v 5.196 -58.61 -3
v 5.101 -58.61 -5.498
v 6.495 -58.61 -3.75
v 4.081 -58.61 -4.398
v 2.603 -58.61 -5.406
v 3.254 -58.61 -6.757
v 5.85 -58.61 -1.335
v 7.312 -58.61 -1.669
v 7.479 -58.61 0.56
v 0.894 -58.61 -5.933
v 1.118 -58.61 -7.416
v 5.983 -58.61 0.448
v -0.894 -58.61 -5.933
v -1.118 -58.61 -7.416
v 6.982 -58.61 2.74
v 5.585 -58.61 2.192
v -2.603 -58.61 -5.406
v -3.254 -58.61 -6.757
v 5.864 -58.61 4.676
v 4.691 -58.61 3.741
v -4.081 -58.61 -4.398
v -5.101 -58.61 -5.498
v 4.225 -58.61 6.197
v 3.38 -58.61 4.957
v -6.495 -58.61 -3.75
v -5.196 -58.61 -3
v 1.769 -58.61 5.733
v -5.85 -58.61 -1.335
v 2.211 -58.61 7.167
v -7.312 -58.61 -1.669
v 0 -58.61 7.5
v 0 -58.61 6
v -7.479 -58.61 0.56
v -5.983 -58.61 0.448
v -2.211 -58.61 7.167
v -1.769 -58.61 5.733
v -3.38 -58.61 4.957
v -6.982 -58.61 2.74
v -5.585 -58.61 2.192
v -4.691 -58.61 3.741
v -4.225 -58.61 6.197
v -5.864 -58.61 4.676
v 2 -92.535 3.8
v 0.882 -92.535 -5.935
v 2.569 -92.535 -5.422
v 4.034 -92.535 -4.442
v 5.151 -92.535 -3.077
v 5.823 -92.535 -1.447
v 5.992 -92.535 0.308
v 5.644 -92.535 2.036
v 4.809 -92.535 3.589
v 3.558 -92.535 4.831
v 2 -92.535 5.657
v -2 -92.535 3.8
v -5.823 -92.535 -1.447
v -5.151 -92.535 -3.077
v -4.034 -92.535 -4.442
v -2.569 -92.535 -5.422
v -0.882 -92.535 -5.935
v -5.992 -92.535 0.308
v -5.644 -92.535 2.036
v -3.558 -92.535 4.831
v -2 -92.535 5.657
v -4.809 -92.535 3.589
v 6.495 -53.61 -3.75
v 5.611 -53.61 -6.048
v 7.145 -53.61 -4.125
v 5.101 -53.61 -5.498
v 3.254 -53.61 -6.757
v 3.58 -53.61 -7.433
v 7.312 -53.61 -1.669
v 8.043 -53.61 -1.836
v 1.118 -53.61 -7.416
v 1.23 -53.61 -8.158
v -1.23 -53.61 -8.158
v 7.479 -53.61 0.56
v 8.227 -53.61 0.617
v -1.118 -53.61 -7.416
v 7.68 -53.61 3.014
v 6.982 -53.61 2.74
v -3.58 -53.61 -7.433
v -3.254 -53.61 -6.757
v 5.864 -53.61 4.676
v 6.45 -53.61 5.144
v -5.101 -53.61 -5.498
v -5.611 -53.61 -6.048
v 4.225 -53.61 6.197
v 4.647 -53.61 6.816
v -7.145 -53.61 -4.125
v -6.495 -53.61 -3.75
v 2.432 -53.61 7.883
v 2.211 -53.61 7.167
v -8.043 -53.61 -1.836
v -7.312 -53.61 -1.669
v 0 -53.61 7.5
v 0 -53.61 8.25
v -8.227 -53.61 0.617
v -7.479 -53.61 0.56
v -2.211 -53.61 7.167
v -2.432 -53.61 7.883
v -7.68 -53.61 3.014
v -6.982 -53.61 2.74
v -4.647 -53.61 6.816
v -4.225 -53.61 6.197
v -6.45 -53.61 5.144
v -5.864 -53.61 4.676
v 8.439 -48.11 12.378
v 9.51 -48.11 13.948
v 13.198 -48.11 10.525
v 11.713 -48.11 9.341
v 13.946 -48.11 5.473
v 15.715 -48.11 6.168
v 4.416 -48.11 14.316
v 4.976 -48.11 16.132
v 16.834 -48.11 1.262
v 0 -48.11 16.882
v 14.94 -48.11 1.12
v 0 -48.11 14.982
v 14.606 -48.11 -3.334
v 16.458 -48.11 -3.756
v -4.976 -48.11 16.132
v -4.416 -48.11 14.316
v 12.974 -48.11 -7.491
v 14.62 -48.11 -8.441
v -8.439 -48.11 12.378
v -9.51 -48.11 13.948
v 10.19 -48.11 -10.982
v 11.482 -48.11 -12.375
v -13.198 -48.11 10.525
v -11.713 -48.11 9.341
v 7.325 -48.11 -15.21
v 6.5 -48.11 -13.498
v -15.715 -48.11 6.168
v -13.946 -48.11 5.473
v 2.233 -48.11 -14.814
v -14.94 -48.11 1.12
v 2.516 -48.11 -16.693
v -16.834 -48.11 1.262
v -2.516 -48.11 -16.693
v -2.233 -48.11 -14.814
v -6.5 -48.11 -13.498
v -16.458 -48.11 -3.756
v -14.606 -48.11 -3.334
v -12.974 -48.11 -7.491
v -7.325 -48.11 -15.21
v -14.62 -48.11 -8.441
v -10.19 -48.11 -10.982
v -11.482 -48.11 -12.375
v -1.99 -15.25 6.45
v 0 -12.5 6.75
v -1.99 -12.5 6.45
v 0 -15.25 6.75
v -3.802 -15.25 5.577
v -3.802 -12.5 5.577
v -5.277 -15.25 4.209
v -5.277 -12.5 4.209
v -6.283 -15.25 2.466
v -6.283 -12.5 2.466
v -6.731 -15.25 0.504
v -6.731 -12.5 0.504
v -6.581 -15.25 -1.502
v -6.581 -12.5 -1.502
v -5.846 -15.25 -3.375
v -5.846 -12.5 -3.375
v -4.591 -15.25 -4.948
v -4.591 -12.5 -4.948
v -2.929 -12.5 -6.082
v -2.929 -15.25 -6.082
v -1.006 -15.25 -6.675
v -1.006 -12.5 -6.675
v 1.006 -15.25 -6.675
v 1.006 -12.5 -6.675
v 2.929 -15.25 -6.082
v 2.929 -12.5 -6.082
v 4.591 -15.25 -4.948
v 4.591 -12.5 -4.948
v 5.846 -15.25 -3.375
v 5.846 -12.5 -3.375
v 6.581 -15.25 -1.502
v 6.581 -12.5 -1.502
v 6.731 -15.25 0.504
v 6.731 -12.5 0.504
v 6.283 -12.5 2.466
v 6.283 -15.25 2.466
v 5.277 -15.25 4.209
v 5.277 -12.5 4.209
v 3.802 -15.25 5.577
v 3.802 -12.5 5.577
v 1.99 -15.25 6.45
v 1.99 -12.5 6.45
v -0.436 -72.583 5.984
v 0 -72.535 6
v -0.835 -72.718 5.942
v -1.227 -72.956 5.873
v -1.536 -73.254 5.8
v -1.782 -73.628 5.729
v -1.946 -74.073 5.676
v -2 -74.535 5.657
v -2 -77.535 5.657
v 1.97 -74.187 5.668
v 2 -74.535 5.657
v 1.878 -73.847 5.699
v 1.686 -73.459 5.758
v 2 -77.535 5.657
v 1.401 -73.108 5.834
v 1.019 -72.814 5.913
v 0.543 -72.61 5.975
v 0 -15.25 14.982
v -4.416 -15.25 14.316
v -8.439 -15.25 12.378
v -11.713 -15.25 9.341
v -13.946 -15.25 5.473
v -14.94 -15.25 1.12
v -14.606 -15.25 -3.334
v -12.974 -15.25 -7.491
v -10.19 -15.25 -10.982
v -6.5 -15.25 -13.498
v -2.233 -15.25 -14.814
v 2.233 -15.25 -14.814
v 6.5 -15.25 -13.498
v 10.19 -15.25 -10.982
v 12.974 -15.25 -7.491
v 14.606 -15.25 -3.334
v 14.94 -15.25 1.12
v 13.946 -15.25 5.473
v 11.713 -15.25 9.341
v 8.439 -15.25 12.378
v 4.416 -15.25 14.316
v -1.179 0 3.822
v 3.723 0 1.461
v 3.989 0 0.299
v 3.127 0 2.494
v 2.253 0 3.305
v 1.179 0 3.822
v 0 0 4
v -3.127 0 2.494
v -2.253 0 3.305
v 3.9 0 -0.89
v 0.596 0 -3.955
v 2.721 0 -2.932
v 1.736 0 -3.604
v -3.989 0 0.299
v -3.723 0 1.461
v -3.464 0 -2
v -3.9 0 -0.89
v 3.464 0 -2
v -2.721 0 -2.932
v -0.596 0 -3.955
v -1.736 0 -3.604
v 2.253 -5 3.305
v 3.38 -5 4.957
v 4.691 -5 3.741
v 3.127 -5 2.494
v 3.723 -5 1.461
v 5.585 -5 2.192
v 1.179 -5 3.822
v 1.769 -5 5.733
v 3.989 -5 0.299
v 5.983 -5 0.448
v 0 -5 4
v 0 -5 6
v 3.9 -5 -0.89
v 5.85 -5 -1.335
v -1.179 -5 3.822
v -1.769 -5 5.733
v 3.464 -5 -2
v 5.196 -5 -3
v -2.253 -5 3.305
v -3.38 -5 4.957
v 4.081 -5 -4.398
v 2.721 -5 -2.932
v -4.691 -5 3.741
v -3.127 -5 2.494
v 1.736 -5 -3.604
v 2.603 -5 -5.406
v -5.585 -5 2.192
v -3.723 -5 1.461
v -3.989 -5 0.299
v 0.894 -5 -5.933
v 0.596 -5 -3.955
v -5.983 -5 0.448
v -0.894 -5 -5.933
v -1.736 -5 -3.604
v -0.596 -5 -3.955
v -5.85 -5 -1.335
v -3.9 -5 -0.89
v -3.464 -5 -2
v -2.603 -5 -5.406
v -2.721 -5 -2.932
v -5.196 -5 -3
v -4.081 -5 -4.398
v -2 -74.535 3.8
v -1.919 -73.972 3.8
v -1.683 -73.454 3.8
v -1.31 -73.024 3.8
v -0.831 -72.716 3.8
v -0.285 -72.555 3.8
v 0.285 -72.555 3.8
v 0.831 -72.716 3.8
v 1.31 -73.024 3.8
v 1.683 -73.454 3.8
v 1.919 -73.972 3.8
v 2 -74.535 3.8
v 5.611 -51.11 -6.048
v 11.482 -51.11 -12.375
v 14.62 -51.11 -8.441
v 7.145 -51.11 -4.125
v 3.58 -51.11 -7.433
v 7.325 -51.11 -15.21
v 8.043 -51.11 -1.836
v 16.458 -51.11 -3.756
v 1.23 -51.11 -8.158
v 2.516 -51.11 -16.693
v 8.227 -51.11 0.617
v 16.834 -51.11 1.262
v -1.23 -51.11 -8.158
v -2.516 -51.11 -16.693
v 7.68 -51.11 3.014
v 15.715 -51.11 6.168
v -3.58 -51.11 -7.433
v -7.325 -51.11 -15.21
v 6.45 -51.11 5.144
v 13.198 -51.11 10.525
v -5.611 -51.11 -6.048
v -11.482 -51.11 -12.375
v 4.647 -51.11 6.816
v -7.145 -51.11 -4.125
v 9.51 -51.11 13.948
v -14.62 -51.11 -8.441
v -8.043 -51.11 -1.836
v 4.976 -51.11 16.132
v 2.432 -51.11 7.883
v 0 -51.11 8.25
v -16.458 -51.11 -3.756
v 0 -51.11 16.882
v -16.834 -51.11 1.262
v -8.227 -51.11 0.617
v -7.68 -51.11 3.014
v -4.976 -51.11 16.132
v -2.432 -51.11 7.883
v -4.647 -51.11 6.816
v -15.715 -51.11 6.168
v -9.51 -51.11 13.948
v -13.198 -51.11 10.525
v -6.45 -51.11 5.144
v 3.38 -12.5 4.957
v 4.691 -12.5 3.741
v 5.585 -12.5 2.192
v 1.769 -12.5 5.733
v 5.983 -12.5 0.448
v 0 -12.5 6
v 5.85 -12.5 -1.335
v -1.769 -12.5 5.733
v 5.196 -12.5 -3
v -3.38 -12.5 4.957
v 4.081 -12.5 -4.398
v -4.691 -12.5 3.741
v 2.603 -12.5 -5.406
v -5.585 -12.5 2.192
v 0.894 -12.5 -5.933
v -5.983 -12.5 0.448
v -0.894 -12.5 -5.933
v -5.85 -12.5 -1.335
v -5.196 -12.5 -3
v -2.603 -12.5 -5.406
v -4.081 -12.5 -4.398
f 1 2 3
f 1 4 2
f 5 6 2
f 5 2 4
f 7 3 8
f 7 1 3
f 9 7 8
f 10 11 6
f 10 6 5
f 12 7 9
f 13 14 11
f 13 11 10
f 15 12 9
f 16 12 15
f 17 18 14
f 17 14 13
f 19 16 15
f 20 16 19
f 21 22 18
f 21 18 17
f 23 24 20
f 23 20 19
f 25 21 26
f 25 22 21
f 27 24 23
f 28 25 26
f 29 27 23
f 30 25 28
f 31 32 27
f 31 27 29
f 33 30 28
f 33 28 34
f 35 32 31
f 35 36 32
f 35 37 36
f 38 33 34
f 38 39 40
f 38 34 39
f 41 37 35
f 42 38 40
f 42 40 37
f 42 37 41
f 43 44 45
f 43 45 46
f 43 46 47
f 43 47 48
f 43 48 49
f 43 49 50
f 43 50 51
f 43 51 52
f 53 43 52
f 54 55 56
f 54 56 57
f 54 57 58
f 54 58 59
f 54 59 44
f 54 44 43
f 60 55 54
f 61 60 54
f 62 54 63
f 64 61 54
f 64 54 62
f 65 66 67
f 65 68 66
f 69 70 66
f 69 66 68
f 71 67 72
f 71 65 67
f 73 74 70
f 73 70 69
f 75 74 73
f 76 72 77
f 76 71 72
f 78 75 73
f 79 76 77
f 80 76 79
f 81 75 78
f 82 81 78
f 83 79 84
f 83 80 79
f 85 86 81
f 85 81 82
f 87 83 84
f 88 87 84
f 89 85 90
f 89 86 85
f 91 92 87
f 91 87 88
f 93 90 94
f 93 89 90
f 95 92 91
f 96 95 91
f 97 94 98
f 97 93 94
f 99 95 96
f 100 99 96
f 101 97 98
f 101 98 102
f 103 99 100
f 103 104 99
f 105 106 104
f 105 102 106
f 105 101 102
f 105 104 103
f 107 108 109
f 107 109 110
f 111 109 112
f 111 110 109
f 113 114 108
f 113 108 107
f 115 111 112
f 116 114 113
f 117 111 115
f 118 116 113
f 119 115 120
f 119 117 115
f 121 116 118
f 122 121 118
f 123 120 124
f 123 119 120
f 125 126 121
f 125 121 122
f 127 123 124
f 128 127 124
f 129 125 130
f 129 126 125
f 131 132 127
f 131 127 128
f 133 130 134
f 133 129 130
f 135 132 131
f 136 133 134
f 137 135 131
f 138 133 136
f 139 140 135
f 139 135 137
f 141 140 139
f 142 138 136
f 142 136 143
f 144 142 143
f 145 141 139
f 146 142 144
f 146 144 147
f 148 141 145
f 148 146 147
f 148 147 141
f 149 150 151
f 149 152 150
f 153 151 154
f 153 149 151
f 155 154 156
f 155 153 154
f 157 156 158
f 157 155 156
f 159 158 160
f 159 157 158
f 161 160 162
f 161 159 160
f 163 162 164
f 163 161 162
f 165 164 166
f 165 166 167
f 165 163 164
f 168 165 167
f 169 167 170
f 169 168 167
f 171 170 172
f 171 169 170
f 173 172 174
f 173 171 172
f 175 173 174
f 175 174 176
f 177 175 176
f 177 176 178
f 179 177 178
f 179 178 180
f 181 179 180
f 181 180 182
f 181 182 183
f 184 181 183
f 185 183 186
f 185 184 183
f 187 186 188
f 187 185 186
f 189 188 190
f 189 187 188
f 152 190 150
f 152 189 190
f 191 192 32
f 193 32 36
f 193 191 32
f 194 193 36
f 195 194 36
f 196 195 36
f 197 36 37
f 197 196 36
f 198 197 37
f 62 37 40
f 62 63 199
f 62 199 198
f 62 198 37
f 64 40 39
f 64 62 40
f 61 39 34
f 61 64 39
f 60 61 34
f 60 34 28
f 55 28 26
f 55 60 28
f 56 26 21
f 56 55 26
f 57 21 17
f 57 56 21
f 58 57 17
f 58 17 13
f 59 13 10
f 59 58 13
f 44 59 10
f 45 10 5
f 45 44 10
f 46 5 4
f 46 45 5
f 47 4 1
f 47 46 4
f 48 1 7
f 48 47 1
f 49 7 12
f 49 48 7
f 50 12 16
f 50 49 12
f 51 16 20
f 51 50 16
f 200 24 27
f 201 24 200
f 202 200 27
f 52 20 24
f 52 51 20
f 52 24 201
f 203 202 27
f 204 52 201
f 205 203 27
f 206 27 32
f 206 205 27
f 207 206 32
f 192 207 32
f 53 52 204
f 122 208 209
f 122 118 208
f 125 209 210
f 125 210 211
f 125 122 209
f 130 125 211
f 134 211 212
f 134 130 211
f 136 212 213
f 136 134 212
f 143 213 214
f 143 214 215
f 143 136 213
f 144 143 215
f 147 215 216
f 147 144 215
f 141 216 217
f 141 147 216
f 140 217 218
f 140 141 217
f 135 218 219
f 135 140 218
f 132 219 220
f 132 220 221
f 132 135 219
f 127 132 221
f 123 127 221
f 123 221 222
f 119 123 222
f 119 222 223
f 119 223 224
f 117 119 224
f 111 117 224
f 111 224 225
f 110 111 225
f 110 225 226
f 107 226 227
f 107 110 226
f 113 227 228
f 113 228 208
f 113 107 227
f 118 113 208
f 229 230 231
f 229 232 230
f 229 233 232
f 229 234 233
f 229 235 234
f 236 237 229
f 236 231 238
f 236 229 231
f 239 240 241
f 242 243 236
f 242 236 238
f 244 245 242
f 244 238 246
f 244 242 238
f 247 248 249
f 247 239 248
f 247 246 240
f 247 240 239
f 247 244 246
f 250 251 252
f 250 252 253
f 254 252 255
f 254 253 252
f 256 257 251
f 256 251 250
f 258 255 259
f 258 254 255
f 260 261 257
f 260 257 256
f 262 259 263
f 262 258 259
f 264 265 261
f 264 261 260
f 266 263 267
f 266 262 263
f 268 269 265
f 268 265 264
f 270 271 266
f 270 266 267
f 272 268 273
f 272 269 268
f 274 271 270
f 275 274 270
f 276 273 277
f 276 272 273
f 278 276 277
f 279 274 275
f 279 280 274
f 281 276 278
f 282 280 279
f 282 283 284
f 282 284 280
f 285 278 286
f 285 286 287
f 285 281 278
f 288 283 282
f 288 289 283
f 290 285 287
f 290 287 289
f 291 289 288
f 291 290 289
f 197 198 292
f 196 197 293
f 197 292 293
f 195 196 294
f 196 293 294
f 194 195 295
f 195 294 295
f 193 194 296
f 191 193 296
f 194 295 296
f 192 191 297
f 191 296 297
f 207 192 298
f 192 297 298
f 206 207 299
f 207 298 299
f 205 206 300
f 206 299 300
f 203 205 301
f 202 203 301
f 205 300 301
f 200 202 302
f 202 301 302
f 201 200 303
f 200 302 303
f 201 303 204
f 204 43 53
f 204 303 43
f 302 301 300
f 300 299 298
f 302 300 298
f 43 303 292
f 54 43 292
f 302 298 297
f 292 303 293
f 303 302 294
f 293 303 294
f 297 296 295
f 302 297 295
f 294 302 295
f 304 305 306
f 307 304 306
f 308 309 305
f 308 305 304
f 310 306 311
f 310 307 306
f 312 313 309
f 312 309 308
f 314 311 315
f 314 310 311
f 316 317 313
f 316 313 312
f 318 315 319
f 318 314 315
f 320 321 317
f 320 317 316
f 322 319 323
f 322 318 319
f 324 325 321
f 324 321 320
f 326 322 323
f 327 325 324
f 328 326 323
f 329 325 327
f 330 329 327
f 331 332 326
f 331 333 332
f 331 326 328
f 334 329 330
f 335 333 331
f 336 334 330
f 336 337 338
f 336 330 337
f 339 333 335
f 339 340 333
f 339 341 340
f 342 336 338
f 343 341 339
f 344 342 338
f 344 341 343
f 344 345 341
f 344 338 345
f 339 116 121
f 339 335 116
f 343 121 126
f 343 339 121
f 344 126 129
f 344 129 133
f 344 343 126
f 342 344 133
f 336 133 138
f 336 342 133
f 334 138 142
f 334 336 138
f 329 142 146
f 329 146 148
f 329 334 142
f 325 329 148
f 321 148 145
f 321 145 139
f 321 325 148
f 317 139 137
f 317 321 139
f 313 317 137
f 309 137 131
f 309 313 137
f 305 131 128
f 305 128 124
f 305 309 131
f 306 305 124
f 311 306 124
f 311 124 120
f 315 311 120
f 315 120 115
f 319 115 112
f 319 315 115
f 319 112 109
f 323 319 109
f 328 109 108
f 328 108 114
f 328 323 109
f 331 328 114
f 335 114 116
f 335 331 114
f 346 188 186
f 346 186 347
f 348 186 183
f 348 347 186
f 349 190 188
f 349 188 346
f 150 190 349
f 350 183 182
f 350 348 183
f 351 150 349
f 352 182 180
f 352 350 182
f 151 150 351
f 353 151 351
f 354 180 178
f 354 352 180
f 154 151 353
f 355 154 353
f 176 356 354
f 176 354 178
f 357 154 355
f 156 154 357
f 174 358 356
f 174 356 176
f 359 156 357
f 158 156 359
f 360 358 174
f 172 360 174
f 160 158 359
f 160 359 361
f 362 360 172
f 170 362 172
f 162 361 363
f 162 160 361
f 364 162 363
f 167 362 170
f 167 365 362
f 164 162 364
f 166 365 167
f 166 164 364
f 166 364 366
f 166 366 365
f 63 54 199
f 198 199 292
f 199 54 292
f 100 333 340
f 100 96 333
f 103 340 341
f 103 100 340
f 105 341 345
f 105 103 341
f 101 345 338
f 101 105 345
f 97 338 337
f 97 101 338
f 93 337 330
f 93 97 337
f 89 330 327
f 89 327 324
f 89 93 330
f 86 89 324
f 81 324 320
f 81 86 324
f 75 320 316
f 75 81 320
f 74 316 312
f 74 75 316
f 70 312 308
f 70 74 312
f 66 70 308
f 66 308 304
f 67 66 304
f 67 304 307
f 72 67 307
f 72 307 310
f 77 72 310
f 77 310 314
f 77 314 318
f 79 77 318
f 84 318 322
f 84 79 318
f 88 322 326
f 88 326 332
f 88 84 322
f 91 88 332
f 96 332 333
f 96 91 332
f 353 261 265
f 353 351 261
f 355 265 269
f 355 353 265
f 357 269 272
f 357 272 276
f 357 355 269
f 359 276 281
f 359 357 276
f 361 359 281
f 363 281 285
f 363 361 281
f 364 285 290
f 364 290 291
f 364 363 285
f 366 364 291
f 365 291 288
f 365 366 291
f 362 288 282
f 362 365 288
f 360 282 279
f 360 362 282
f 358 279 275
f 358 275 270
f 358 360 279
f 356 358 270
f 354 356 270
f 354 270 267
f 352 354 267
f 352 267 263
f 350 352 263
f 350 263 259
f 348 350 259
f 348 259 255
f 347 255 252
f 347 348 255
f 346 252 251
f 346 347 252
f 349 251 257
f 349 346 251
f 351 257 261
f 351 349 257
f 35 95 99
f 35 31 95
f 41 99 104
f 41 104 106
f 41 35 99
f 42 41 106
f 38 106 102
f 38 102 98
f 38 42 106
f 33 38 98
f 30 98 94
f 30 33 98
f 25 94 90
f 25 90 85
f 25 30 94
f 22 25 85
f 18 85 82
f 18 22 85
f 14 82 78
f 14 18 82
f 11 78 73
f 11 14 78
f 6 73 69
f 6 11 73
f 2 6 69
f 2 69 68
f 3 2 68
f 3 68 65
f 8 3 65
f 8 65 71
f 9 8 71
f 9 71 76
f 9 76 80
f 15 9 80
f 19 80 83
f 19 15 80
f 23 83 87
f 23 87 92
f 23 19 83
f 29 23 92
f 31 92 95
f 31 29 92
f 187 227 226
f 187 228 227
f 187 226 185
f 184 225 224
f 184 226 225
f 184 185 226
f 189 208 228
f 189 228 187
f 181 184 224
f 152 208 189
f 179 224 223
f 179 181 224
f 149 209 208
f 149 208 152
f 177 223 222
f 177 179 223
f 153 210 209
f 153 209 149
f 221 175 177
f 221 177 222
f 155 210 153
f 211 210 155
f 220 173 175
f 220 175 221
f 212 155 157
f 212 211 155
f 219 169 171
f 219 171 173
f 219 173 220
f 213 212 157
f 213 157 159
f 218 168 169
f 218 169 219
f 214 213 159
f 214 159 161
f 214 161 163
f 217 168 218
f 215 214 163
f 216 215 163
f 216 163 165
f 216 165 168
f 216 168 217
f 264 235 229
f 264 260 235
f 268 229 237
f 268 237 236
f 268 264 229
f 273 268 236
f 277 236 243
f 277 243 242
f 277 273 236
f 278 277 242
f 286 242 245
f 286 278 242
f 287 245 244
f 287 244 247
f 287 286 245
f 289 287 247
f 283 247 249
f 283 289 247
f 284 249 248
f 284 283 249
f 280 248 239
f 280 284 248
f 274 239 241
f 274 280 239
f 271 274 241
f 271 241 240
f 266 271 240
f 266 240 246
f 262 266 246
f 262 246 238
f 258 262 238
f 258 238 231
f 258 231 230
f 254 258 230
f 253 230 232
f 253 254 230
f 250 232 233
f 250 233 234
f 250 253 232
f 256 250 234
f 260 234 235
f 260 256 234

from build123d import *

# Parameters (mm, degrees)
CUT_EXTRUDE1_DEPTH = 15
CUT_EXTRUDE2_DEPTH = 97.309063486


with BuildPart() as part:
    # Sketch2 → Revolve1 (revolve)
    with BuildSketch(Plane.XY, mode=Mode.PRIVATE) as revolve1_sk:
        Polygon((0, 0), (-4, 0), (-4, -5), (-6, -5), (-6, -12.5), (-6.75, -12.5), (-6.75, -15.25), (-14.9815, -15.25), (-14.9815, -48.11), (-16.8815, -48.11), (-16.8815, -51.11), (-8.25, -51.11), (-8.25, -53.61), (-7.5, -53.61), (-7.5, -58.61), (-6, -58.61), (-6, -92.535), (0, -92.535), align=None)
    revolve(revolve1_sk.sketch.rotate(Axis((0, 40.033449689, 0), (0, -1, 0)), 270), axis=Axis((0, 40.033449689, 0), (0, -1, 0)))

    # Sketch3 → Cut-Extrude1 (cut)
    with BuildSketch(Plane.XZ.offset(92.535)):
        with BuildLine():
            Line((-2, 5.656854249), (-2, 3.8))
            Line((-2, 3.8), (2, 3.8))
            Line((2, 3.8), (2, 5.656854249))
            ThreePointArc((2, 5.656854249), (0, 6), (-2, 5.656854249))
        make_face()
    extrude(amount=-CUT_EXTRUDE1_DEPTH, mode=Mode.SUBTRACT)

    # Sketch4 → Cut-Extrude2 (cut, through all)
    with BuildSketch(Plane.XY.offset(3.8)):
        with BuildLine():
            Line((-2, -77.535), (-2, -74.535))
            ThreePointArc((-2, -74.535), (0, -72.535), (2, -74.535))
            Line((2, -74.535), (2, -77.535))
            Line((2, -77.535), (2, -92.535))
            Line((2, -92.535), (-2, -92.535))
            Line((-2, -92.535), (-2, -77.535))
        make_face()
    extrude(amount=CUT_EXTRUDE2_DEPTH, mode=Mode.SUBTRACT)


solid = part.part
